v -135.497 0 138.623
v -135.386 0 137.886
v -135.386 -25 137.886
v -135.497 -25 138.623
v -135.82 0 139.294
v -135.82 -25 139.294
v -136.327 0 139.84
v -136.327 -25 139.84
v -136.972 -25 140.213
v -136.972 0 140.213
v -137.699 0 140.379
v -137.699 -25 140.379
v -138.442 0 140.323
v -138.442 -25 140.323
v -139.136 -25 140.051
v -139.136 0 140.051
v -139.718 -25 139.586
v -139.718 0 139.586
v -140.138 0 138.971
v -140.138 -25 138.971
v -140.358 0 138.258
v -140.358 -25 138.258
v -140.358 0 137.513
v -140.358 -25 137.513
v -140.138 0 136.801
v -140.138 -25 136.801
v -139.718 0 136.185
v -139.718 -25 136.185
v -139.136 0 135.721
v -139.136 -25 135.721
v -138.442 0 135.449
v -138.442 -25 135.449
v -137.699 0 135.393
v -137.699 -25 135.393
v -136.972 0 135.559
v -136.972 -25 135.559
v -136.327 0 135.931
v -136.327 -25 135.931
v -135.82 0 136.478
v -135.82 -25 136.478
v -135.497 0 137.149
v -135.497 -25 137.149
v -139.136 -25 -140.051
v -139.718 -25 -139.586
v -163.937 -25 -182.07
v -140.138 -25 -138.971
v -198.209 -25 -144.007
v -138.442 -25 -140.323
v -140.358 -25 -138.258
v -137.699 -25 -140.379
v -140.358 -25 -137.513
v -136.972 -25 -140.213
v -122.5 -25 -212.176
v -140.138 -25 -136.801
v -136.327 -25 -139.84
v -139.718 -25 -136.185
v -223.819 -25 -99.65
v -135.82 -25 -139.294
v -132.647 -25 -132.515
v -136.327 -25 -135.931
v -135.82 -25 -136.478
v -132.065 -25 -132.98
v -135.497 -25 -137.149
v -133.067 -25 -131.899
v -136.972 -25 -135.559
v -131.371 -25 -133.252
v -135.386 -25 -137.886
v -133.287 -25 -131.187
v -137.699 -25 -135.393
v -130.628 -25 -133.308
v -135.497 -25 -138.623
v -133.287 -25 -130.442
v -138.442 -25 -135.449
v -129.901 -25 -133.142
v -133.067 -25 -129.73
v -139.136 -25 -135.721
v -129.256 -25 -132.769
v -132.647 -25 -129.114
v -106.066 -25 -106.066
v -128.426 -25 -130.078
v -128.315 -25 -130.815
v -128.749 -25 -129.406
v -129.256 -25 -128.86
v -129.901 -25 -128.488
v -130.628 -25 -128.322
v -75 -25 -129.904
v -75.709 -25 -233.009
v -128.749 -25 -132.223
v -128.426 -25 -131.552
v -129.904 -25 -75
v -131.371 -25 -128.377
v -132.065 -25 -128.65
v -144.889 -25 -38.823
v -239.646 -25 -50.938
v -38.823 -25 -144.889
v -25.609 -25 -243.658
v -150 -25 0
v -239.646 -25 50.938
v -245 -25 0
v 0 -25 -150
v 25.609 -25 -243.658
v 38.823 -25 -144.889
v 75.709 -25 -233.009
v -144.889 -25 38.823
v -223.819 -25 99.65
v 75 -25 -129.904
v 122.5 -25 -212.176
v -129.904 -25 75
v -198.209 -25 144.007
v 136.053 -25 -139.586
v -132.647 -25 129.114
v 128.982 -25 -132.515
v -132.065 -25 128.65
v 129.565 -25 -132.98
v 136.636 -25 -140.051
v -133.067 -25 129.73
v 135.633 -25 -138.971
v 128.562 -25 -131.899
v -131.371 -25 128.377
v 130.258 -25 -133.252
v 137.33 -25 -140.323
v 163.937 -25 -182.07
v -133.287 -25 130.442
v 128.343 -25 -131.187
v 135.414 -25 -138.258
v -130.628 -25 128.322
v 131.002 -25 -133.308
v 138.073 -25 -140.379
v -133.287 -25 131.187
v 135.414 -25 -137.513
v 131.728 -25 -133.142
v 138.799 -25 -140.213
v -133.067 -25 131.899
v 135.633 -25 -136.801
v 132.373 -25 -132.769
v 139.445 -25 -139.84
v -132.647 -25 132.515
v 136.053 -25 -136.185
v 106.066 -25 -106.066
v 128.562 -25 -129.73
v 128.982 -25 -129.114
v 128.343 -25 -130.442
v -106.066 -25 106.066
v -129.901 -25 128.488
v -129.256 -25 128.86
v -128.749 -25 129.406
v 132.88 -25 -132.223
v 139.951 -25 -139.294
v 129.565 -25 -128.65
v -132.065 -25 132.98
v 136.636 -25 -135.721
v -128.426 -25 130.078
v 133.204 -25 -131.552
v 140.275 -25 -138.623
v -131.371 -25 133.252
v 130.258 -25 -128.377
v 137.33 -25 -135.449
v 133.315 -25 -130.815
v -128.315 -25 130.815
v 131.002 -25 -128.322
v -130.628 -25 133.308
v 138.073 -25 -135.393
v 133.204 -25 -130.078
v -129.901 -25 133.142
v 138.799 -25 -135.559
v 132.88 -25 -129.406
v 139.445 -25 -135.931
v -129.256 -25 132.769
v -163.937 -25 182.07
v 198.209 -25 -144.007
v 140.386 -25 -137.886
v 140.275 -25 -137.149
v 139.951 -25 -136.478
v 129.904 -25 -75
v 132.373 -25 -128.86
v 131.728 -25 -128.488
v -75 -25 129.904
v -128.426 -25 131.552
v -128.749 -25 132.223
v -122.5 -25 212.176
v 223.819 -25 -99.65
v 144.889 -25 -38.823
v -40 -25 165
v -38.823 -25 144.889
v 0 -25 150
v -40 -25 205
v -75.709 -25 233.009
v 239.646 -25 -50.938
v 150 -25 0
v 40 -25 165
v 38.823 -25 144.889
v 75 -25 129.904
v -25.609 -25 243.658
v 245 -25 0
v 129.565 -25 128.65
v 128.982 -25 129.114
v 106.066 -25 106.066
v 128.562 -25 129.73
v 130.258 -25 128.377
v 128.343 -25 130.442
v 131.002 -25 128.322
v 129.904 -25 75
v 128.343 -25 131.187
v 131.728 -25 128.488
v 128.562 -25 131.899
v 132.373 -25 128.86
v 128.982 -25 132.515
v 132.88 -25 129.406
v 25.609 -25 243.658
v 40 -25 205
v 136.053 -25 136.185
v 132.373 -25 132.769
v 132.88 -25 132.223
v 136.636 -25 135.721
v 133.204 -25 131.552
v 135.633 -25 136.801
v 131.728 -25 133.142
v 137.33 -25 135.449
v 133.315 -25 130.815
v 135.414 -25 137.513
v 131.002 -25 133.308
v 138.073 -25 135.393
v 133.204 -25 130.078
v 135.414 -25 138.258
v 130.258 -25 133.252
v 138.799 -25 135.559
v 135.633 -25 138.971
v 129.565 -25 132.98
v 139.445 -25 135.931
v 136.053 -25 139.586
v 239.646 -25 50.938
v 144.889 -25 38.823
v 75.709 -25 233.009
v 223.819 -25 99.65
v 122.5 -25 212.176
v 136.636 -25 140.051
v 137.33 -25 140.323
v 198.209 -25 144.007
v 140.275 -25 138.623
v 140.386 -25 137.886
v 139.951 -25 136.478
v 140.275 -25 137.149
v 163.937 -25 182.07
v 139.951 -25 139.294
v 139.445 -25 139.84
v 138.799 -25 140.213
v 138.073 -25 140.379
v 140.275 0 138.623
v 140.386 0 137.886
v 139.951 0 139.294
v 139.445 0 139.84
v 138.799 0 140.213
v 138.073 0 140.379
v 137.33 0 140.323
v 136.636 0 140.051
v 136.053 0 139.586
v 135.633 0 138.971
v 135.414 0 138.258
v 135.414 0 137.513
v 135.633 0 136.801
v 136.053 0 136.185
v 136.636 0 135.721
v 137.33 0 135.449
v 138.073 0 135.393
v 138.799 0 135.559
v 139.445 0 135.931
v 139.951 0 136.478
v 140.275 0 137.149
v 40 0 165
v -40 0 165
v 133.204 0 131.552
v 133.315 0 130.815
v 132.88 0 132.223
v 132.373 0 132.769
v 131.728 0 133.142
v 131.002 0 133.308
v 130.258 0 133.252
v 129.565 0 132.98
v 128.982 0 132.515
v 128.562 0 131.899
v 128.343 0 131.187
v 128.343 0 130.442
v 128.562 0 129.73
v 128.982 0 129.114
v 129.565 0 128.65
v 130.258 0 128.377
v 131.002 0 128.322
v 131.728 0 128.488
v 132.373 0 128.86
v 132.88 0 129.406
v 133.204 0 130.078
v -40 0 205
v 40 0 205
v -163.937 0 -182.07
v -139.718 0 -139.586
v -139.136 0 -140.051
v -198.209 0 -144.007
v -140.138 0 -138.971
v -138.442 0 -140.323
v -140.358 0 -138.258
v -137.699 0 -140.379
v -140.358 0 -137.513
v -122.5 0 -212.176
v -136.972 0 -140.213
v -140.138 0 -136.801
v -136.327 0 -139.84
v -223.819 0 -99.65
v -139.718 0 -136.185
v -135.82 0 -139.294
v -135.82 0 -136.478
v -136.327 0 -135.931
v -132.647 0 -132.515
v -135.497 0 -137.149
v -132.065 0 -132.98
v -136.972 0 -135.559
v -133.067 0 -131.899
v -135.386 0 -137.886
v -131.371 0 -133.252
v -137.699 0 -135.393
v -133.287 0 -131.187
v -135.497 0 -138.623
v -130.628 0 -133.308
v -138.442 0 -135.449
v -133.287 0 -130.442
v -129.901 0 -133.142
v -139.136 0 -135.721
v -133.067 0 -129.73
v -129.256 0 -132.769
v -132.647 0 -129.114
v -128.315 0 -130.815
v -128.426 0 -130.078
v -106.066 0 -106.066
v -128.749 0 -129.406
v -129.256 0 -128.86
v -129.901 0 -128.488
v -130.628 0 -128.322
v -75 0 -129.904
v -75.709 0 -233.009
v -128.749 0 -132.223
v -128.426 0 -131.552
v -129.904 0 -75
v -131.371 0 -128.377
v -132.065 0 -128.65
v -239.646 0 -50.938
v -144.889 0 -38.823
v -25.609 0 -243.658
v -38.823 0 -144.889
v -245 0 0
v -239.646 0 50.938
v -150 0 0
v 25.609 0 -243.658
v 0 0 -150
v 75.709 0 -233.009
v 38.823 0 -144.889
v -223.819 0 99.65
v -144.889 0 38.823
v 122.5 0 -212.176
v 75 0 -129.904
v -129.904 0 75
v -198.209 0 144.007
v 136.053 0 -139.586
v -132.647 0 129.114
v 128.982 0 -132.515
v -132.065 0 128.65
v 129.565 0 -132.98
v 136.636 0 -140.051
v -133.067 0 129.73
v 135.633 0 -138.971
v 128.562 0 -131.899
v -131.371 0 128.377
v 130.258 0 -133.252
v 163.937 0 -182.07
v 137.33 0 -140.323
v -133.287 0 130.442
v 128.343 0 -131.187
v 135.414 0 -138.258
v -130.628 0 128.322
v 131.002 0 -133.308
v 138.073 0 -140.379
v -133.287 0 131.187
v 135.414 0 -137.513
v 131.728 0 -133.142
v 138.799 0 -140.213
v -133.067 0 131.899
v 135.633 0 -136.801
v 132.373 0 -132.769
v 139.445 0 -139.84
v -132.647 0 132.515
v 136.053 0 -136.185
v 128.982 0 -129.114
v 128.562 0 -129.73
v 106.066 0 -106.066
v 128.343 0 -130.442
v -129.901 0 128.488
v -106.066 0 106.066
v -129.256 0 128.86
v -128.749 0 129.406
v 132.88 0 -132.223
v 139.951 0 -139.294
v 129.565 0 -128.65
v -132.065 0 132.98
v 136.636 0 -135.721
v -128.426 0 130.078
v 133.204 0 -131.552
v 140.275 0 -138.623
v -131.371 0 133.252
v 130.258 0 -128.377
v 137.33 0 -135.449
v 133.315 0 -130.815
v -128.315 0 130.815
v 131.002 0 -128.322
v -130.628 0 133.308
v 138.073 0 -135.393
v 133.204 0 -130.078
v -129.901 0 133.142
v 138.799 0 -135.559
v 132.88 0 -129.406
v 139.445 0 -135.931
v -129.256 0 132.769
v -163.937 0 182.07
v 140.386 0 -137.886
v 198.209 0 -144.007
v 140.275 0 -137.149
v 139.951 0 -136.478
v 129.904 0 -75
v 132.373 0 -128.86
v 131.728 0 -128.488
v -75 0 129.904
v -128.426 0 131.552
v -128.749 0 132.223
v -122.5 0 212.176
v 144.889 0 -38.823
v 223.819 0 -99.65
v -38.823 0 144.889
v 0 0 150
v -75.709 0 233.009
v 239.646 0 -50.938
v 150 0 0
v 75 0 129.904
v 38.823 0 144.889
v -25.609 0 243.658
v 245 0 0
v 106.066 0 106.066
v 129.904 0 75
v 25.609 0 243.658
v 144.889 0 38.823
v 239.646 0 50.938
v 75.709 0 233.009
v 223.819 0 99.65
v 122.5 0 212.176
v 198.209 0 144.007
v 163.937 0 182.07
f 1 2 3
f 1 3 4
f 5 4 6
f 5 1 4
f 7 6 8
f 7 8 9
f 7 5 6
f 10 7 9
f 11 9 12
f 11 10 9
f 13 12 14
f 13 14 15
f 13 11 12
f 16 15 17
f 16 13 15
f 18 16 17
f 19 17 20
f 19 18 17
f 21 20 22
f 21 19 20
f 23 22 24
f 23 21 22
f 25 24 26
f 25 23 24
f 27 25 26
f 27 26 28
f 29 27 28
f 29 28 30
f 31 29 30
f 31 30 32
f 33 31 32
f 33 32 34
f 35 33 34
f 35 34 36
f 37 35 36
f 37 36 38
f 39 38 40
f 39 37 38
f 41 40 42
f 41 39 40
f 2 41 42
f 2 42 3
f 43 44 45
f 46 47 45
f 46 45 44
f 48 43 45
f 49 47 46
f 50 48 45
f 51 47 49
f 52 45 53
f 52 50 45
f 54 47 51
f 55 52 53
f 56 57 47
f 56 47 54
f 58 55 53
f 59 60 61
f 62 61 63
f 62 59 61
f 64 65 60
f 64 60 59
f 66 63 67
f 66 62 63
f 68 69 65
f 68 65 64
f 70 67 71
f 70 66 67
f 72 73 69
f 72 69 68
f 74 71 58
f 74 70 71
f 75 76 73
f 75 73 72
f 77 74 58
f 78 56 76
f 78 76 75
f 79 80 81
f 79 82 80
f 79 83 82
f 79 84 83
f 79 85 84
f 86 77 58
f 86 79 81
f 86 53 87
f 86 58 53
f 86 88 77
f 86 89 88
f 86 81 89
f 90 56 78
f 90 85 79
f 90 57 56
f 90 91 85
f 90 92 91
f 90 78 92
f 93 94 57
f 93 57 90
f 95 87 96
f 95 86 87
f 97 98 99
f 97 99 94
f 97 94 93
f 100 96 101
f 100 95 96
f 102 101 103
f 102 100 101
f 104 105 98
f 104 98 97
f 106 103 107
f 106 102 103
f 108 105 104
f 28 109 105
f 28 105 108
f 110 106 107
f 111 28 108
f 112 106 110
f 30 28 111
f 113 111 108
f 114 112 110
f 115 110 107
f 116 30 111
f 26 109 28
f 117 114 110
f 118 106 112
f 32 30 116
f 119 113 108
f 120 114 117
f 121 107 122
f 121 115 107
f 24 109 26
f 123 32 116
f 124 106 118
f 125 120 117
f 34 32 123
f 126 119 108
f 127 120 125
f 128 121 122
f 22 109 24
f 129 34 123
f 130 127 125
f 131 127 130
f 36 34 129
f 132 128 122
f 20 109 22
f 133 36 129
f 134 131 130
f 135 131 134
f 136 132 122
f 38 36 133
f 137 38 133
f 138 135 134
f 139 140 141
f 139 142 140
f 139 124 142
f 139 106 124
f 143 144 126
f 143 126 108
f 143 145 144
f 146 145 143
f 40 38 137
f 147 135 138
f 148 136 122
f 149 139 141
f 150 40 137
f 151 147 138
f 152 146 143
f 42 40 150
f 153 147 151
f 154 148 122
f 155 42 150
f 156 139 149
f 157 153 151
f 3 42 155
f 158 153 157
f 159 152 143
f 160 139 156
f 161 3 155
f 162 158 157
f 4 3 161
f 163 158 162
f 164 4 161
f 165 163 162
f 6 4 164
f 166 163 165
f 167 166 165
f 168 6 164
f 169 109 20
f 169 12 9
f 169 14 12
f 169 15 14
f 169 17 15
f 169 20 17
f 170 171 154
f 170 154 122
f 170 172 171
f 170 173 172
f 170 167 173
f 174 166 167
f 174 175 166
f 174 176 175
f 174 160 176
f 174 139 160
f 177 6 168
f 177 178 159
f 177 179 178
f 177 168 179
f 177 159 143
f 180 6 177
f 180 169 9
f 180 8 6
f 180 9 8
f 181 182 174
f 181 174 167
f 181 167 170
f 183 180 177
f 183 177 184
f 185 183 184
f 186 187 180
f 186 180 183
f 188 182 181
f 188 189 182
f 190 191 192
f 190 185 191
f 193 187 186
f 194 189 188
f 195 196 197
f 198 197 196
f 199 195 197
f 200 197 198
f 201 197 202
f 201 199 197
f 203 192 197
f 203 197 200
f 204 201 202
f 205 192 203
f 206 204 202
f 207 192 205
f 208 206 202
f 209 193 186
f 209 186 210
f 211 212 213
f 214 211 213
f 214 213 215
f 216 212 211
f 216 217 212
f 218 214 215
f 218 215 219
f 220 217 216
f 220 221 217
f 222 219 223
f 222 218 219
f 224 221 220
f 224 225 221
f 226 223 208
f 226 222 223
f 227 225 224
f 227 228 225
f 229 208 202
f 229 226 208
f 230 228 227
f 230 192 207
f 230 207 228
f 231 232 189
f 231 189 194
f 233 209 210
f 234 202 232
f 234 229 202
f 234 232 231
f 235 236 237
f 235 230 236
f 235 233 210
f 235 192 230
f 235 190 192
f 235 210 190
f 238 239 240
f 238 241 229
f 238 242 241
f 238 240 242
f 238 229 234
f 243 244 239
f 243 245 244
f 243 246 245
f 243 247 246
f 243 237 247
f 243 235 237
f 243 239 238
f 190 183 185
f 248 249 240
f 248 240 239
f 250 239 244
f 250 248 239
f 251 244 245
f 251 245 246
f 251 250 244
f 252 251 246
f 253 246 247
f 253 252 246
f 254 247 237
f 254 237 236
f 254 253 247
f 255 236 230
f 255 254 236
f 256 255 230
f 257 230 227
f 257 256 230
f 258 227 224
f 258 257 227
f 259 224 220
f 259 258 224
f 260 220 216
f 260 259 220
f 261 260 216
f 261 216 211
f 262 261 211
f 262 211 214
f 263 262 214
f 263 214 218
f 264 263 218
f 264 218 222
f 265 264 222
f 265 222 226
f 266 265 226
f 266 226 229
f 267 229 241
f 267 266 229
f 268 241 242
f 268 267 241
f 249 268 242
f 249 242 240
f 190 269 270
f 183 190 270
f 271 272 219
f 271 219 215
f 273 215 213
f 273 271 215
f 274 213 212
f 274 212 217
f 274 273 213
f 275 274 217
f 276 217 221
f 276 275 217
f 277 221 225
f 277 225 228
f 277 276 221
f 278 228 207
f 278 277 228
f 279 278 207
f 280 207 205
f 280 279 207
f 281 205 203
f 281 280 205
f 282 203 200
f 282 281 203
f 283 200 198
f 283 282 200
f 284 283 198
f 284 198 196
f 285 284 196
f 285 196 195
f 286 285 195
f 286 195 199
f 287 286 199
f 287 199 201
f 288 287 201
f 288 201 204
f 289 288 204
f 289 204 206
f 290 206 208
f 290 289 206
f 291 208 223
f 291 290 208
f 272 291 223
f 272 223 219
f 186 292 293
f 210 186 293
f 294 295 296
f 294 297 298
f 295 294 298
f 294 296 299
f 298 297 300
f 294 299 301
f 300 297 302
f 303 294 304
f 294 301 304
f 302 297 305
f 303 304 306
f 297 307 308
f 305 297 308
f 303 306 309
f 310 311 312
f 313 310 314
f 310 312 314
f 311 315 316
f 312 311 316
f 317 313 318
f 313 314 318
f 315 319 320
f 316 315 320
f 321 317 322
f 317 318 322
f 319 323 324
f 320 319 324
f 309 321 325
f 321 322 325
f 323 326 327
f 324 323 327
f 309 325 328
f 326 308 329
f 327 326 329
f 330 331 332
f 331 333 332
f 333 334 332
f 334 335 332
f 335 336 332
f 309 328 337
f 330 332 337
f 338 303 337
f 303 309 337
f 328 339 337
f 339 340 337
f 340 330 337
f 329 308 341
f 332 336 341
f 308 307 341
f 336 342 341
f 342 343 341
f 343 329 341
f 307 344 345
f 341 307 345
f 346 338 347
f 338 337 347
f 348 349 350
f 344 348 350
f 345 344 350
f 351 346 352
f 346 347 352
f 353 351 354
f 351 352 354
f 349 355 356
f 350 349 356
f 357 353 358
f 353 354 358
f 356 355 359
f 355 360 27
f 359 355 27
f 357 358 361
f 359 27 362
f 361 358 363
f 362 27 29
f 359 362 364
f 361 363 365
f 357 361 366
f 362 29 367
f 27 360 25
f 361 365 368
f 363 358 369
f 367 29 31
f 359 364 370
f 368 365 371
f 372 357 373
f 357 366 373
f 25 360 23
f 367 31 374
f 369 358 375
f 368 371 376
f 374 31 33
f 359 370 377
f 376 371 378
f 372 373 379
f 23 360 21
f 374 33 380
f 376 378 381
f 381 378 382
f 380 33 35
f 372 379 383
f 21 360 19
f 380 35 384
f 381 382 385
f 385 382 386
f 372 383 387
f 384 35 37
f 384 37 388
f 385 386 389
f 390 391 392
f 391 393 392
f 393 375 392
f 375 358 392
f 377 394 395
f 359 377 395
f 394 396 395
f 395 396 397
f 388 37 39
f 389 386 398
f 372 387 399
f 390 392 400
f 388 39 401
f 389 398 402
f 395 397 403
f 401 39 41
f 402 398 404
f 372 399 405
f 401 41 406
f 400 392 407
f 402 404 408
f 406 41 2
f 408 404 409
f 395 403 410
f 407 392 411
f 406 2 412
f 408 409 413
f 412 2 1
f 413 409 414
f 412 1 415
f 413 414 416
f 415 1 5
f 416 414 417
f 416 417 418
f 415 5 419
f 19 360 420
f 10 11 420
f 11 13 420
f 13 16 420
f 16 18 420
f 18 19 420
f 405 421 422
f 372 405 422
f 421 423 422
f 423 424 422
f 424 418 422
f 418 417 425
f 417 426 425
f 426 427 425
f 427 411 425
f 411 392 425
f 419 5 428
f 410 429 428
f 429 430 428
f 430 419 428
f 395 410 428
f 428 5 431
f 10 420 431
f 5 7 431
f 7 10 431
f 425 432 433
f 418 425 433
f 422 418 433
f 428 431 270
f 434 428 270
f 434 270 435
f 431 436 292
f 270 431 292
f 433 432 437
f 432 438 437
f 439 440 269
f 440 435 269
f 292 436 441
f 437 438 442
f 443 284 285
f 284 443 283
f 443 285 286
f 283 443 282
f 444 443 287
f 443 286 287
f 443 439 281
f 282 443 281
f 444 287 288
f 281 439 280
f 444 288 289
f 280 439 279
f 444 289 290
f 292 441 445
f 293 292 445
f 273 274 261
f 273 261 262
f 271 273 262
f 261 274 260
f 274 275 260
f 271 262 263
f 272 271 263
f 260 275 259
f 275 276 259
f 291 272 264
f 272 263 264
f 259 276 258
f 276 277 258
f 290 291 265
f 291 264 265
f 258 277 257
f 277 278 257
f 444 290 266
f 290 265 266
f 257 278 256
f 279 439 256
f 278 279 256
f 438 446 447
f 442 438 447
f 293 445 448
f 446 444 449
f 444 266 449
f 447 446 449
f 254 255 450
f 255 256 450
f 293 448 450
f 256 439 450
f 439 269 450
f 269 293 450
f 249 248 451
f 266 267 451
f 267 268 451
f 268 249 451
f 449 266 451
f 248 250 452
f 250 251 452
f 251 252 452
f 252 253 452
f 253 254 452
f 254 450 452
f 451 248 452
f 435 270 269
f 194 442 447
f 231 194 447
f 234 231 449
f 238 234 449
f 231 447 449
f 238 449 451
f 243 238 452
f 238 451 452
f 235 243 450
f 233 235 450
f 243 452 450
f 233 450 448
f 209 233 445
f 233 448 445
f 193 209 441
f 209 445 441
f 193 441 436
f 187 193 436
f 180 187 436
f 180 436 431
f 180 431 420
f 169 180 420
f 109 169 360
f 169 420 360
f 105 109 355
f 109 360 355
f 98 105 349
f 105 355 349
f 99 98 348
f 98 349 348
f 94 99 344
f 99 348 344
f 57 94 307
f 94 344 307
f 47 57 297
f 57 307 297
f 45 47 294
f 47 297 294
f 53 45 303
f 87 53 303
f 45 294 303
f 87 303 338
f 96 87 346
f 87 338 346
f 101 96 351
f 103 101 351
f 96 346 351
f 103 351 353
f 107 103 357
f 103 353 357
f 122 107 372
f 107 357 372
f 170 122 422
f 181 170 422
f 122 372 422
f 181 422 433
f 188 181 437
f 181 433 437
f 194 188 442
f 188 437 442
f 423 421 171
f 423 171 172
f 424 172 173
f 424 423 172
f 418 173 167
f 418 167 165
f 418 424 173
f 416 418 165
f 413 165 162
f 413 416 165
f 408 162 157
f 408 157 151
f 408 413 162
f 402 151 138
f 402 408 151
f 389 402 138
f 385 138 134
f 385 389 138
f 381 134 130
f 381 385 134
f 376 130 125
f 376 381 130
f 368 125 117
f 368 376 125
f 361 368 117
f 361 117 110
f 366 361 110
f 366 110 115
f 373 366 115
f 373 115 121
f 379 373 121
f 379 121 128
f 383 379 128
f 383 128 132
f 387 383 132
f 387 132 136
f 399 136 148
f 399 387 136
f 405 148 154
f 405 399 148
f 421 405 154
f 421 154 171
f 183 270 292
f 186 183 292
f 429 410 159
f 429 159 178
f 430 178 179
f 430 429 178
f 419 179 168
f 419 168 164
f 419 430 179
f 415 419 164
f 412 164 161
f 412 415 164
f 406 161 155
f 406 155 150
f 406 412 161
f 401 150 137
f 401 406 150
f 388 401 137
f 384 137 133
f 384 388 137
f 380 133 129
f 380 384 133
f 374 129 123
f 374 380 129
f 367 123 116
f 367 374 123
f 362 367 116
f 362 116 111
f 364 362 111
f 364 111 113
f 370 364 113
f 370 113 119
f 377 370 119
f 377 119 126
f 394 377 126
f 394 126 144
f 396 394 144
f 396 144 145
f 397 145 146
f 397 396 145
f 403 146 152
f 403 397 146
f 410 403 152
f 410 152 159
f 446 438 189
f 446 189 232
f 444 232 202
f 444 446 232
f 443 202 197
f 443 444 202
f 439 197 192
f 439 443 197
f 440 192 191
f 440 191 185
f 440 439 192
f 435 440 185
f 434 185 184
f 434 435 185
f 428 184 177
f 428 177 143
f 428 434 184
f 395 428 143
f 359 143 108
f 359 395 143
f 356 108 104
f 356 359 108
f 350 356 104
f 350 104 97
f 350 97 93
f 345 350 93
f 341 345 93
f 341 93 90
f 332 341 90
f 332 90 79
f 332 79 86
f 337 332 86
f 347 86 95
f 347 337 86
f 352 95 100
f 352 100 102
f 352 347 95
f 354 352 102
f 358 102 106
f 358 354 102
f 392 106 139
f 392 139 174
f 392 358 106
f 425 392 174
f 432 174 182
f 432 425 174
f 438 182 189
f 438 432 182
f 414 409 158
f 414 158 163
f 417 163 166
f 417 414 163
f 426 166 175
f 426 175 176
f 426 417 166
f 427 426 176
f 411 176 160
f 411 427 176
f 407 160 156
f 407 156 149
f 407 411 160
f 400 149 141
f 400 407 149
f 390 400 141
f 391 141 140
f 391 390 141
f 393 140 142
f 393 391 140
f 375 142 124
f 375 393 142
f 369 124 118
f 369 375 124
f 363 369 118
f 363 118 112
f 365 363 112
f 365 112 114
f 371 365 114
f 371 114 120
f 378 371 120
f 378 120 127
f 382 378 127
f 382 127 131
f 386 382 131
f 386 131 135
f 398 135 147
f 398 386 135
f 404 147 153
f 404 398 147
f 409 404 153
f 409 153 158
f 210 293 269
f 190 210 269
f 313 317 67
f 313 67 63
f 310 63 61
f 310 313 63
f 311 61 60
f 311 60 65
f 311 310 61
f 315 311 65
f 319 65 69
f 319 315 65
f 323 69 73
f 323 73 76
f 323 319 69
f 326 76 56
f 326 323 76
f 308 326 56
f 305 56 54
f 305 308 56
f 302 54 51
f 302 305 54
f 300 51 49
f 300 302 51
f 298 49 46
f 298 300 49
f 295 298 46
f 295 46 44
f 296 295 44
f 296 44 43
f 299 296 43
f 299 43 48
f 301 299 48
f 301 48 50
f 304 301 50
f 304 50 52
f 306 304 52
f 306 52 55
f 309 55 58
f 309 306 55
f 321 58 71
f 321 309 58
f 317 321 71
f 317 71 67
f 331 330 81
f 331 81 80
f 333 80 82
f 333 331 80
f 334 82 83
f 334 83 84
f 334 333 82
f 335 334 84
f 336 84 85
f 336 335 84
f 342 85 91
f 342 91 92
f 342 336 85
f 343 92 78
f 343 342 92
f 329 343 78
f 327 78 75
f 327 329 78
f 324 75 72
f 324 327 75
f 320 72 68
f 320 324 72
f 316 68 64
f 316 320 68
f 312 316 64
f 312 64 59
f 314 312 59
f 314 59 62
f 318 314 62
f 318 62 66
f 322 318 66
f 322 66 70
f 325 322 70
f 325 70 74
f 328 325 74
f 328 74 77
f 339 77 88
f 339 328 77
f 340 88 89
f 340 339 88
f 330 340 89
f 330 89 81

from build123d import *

# Parameters (mm, degrees)
F0_R     = 245
F0_R_2   = 2.5
F0_R_3   = 150
F0_W     = 25
F0_H     = 10
F1_DEPTH = 25


with BuildPart() as f1:
    # F0 (on Front) → F1 (new body)
    with BuildSketch(Plane.XZ):
        Circle(F0_R)
        with Locations((-137.8858223314, -137.8858223314)):
            Circle(F0_R_2, mode=Mode.SUBTRACT)
        with Locations((-130.8147545195, -130.8147545195)):
            Circle(F0_R_2, mode=Mode.SUBTRACT)
        with Locations((137.8858223314, -137.8858223314)):
            Circle(F0_R_2, mode=Mode.SUBTRACT)
        with Locations((130.8147545195, -130.8147545195)):
            Circle(F0_R_2, mode=Mode.SUBTRACT)
        with Locations((-130.8147545195, 130.8147545195)):
            Circle(F0_R_2, mode=Mode.SUBTRACT)
        with Locations((-137.8858223314, 137.8858223314)):
            Circle(F0_R_2, mode=Mode.SUBTRACT)
        Circle(F0_R_3, mode=Mode.SUBTRACT)
        Polygon((40, 205), (40, 165), (-40, 165), (-40, 205), (-12.5, 205), (-12.5, 215), (12.5, 215), (12.5, 205), align=None, mode=Mode.SUBTRACT)
        with Locations((130.8147545195, 130.8147545195)):
            Circle(F0_R_2, mode=Mode.SUBTRACT)
        with Locations((137.8858223314, 137.8858223314)):
            Circle(F0_R_2, mode=Mode.SUBTRACT)
        with Locations((0, 210)):
            Rectangle(F0_W, F0_H)
    extrude(amount=F1_DEPTH)


solid = f1.part
